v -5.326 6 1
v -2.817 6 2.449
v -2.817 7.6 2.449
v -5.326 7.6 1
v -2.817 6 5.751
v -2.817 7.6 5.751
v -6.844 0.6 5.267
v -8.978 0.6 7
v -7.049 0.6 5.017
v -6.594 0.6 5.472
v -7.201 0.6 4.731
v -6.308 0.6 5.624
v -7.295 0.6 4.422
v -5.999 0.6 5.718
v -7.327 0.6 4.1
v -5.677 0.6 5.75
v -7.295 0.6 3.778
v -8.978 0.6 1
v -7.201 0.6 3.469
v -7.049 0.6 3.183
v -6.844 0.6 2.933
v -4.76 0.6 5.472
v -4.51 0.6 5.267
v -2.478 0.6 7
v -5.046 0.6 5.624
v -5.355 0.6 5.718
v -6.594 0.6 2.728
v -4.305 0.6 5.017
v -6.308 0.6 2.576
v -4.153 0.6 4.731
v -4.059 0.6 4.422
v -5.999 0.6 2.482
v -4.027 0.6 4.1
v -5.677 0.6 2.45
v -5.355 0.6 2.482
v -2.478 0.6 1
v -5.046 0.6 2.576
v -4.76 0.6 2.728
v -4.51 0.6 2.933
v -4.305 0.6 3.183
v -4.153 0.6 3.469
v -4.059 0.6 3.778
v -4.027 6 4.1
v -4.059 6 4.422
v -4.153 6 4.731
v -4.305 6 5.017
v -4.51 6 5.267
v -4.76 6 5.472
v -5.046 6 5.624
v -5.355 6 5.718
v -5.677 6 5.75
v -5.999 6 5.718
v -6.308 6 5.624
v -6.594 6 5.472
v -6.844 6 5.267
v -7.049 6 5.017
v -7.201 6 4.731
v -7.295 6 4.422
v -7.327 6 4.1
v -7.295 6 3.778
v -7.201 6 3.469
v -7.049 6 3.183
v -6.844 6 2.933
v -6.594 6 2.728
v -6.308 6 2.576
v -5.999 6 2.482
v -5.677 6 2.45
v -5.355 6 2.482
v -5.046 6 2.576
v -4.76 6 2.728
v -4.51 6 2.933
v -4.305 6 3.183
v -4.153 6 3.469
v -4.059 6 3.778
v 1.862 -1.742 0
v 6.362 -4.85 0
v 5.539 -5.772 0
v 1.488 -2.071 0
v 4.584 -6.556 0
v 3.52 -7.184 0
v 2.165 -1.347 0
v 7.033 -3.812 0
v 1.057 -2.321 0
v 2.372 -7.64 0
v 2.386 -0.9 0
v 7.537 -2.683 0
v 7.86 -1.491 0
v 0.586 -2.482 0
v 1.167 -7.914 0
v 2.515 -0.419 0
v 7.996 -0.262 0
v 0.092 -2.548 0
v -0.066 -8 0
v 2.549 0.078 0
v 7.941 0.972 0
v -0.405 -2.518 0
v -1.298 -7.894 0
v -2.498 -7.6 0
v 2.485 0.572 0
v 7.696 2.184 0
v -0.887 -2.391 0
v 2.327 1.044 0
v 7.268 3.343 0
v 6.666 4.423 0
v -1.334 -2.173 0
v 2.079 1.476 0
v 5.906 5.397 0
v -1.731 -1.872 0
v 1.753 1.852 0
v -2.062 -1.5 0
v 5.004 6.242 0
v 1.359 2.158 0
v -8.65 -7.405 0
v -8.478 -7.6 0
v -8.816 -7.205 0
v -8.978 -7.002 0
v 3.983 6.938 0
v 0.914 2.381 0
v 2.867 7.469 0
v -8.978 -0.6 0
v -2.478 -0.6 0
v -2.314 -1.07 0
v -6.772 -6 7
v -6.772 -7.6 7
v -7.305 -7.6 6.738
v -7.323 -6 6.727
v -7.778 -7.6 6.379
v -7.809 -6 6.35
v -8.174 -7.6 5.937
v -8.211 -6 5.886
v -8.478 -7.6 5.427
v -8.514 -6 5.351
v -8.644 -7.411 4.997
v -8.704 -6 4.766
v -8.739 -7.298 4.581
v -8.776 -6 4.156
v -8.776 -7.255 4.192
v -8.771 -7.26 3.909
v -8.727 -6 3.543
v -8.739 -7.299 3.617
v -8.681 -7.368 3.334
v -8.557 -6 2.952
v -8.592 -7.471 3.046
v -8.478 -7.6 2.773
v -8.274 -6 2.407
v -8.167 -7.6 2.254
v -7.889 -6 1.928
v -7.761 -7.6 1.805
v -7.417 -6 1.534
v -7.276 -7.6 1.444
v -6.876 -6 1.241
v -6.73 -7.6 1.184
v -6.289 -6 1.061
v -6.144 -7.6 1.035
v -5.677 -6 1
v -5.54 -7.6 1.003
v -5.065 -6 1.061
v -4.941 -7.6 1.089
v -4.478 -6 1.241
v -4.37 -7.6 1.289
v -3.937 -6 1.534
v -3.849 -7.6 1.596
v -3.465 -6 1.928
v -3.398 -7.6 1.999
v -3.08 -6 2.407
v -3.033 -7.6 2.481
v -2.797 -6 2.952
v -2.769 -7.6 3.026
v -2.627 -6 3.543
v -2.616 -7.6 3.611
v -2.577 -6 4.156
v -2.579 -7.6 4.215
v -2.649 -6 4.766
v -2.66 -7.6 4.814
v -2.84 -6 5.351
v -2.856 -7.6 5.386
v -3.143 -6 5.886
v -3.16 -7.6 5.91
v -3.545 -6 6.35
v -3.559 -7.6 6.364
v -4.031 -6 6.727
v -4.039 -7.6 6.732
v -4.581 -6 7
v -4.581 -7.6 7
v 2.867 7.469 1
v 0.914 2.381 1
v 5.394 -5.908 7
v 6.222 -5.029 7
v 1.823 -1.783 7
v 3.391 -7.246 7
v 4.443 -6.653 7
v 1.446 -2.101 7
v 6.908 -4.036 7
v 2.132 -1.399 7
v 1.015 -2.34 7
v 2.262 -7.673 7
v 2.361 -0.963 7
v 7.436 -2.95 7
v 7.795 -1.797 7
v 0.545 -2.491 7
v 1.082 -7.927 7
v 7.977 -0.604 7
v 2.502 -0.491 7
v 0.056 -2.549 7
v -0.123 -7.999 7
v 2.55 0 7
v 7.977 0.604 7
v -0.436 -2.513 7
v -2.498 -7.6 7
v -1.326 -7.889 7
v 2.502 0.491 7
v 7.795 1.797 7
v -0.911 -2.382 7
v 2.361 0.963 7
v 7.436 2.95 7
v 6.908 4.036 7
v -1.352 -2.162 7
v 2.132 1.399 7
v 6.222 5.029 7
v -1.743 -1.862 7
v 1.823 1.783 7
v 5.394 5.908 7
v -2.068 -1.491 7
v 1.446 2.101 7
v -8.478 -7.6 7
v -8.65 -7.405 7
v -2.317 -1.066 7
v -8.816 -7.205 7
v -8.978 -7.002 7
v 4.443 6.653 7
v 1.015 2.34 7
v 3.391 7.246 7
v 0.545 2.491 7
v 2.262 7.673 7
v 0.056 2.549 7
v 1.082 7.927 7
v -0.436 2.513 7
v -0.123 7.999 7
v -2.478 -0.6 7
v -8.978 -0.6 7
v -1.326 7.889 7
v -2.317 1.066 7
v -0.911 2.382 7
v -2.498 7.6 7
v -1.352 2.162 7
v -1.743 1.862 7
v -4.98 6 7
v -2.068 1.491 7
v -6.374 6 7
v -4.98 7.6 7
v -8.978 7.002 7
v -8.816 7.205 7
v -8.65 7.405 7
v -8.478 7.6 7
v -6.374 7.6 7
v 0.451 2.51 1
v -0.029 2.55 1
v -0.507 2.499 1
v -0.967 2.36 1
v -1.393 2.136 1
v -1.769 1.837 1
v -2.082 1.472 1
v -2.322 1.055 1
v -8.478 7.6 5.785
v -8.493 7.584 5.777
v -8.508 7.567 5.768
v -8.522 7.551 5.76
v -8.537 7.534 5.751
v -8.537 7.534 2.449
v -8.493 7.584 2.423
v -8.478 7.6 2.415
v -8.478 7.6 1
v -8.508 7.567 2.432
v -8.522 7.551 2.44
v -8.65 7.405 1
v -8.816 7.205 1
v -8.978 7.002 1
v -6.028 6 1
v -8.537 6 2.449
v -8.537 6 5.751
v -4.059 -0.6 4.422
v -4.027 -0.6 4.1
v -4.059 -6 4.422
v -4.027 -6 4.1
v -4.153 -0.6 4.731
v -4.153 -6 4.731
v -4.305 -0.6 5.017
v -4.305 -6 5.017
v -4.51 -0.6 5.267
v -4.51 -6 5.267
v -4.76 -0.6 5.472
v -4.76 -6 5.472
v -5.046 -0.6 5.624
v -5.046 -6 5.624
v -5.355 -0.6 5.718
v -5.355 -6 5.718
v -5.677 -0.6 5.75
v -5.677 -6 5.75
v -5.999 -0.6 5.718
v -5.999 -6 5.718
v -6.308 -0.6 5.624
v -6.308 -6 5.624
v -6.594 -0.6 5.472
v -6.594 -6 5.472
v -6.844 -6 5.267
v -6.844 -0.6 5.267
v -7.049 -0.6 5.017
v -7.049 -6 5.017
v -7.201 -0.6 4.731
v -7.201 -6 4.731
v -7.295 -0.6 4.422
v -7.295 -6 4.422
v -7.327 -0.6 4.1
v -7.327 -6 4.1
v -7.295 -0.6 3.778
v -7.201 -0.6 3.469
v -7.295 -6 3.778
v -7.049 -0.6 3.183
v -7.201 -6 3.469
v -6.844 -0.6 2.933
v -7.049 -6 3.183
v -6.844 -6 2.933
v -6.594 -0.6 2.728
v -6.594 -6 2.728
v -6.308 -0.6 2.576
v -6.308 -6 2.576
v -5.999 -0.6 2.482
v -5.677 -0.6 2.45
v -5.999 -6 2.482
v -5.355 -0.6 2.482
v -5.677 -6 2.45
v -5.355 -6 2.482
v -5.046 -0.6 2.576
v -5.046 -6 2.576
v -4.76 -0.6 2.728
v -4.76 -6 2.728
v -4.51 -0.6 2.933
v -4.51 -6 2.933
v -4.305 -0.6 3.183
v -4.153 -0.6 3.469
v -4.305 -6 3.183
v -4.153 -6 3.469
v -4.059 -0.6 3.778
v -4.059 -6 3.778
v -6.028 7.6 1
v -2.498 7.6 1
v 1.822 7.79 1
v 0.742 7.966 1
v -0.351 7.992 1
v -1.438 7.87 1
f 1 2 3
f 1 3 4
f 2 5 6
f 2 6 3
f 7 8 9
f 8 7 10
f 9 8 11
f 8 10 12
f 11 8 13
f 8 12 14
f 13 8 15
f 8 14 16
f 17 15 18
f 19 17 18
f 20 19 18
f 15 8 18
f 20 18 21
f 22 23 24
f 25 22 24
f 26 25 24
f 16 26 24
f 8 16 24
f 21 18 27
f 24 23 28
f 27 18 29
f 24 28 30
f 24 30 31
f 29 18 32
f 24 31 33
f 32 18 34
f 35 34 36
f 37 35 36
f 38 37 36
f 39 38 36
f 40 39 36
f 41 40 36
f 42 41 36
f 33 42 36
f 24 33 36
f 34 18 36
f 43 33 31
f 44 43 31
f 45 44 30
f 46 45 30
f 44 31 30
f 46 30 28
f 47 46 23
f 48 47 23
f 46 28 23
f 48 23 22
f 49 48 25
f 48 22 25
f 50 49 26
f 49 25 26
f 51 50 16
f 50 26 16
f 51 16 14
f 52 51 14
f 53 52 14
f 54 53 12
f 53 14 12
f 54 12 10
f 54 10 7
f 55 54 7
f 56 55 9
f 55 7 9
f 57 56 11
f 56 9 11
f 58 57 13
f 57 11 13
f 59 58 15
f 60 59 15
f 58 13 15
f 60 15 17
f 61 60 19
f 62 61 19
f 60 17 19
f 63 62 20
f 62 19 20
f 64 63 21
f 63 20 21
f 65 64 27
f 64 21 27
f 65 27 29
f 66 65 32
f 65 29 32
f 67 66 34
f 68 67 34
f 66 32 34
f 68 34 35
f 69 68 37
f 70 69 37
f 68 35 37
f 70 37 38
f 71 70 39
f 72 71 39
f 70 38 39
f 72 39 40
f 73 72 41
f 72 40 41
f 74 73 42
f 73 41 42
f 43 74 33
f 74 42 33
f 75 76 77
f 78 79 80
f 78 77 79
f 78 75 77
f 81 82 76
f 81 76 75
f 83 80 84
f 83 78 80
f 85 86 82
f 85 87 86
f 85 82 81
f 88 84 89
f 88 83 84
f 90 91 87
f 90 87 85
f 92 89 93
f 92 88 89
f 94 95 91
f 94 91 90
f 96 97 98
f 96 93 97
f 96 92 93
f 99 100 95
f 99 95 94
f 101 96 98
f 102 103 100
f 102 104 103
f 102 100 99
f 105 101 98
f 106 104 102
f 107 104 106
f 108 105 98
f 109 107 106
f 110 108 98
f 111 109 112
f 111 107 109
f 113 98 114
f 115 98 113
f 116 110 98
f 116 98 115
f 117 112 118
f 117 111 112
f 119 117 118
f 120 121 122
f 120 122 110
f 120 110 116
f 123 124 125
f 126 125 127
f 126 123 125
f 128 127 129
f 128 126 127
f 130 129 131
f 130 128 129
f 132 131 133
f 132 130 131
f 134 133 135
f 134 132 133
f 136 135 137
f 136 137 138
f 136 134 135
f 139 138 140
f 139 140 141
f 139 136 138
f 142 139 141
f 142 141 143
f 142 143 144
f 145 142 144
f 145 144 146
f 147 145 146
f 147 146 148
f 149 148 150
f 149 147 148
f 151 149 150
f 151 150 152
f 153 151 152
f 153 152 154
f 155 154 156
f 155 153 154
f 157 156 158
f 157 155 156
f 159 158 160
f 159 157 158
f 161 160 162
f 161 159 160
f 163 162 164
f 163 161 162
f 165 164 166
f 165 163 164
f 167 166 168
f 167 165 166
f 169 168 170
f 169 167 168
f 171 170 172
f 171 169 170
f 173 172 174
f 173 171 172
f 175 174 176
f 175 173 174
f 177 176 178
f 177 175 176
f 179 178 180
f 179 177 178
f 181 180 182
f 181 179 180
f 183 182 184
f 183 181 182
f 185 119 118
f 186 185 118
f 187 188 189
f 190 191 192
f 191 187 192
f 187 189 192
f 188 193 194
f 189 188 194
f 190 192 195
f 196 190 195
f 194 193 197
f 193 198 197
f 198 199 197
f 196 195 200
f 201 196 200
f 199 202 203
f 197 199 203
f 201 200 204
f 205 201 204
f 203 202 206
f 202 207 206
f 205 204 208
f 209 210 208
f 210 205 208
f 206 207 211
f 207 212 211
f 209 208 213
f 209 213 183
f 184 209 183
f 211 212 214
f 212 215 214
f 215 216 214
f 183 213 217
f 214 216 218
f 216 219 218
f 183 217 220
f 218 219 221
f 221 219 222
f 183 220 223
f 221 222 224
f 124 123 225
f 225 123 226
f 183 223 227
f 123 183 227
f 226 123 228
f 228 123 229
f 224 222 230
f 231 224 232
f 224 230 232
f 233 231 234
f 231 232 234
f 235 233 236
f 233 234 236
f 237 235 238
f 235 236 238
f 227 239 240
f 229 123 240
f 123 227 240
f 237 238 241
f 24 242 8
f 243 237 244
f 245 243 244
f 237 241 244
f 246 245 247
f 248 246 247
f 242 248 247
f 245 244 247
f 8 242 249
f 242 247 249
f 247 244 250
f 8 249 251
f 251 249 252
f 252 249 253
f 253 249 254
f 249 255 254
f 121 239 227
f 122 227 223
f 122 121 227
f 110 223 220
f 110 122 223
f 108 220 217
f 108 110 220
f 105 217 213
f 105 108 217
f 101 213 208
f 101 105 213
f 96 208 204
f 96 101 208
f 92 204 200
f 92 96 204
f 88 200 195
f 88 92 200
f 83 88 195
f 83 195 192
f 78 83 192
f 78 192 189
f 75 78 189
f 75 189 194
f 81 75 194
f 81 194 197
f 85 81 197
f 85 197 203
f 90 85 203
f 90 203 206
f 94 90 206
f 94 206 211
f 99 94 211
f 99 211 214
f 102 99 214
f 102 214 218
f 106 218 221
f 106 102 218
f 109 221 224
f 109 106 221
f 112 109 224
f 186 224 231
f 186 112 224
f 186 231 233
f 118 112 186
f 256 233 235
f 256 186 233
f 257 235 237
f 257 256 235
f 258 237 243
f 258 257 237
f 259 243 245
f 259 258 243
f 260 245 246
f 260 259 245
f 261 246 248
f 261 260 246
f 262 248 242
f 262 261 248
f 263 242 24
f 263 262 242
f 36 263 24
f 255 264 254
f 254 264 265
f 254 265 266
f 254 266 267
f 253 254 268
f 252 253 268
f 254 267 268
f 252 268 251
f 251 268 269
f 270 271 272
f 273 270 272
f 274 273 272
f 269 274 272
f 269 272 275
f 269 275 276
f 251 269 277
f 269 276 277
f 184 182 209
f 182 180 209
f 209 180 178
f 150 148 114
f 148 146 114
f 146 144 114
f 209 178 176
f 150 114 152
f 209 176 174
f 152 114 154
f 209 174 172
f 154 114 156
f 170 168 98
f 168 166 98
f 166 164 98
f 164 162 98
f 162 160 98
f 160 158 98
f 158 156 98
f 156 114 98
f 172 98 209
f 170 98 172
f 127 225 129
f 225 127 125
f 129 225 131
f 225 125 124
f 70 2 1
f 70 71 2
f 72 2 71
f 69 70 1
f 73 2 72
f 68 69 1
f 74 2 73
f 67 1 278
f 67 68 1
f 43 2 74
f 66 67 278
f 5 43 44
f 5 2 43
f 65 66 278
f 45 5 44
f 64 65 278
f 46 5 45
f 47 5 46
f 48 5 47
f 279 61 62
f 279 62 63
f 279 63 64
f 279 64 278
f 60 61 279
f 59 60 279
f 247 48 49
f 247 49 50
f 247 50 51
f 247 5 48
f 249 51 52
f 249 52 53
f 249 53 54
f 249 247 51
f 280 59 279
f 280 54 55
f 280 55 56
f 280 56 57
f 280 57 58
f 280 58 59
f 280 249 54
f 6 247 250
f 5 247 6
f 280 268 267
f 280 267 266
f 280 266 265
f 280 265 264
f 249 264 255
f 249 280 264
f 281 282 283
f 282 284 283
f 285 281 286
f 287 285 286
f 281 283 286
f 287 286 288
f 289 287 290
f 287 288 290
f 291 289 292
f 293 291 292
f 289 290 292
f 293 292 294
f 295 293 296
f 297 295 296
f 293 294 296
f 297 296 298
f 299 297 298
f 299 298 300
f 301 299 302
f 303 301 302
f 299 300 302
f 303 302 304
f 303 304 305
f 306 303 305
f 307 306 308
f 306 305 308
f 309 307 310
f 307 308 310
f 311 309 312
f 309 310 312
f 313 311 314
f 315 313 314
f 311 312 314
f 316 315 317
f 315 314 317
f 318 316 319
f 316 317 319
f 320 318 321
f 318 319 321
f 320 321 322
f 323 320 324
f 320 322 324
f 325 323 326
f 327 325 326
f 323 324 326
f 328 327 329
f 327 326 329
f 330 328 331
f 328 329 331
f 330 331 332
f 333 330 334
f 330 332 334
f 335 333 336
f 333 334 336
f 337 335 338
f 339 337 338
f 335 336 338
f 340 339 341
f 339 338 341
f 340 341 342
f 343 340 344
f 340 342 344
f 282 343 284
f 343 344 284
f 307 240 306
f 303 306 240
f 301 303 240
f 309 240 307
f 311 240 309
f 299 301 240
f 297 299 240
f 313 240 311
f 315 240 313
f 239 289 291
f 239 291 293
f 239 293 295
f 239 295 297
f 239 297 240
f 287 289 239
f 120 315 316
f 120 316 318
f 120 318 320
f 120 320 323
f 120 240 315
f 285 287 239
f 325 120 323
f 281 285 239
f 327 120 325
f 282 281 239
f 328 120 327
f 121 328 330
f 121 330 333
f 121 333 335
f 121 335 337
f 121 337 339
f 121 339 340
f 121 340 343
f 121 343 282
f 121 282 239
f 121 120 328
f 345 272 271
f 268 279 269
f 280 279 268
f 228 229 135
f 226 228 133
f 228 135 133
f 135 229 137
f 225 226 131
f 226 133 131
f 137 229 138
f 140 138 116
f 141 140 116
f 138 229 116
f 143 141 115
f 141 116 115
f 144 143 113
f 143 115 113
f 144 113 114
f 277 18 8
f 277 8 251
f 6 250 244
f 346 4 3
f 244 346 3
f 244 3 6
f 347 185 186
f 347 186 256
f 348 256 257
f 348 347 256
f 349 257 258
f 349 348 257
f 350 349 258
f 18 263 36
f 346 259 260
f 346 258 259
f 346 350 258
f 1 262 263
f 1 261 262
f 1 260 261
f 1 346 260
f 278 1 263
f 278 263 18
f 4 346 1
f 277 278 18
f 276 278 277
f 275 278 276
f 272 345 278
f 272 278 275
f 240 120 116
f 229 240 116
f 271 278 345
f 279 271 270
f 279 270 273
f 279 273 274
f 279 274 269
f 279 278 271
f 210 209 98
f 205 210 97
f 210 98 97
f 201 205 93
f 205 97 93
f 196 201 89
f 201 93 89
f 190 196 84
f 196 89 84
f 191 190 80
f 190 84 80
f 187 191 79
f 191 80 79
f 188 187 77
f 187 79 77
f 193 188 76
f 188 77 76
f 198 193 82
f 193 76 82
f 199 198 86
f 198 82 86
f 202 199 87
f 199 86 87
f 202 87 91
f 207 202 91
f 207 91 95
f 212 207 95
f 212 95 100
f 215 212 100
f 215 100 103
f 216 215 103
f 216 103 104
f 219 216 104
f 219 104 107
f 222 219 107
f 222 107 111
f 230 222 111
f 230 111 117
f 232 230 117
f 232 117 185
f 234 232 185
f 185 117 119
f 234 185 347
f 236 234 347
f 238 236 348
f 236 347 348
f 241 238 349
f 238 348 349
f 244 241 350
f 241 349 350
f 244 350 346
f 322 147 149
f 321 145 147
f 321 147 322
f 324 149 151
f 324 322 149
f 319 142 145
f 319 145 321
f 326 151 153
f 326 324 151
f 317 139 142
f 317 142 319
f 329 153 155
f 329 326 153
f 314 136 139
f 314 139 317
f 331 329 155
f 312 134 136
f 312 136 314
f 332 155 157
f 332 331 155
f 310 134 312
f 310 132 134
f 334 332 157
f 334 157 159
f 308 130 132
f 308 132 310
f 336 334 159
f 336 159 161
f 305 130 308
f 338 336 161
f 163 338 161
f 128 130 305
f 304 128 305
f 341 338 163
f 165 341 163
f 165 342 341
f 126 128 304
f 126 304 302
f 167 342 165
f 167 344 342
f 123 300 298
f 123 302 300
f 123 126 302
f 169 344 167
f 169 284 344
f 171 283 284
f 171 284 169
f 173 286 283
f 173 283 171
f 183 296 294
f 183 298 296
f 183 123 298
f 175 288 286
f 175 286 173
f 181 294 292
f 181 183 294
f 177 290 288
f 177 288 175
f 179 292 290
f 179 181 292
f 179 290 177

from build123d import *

# Parameters (mm, degrees)
SKETCH002_AS_DRAWN_R                 = 1.65
EXTRUDE003_DEPTH                     = 6
EXTRUDE003_ONTO_SKETCH002_ROLL_ANGLE = 90
SKETCH003_R                          = 3.1
PAD_DEPTH                            = 5
PAD001_DEPTH                         = 5
EXTRUDE_DEPTH                        = 1
EXTRUDE002_DEPTH                     = 7


with BuildPart() as body:
    # Sketch002 as drawn → Extrude003 (new, symmetric)
    with BuildSketch(Plane.XY):
        with Locations((-5.676932, 4.1)):
            Circle(SKETCH002_AS_DRAWN_R)
    extrude(amount=EXTRUDE003_DEPTH, both=True)


with BuildPart() as body_1:
    # Extrude003 onto Sketch002 roll: moved
    add(body.part.rotate(Axis((0, 0, 0), (1, 0, 0)), EXTRUDE003_ONTO_SKETCH002_ROLL_ANGLE))


with BuildPart() as body_2:
    # Extrude003 onto Sketch002 placement: moved
    add(body_1.part)

    # Sketch003 (on Face3 of BaseFeature) → Pad (new body)
    with BuildSketch(Plane.XZ.offset(6)):
        with Locations((-5.676932, 4.1)):
            Circle(SKETCH003_R)
    extrude(amount=PAD_DEPTH)

    # Sketch004 (on Face1 of Pad) → Pad001 (join)
    with BuildSketch(Plane(origin=(0, 6, 0), x_dir=(-1, 0, 0), z_dir=(0, 1, 0))):
        Polygon((5.676932, 0.797556), (8.536932, 2.448778), (8.536932, 5.751222), (5.676932, 7.402444), (2.816932, 5.751222), (2.816932, 2.448778), align=None)
    extrude(amount=PAD001_DEPTH)


with BuildPart() as extrude001:
    # Sketch001 → Extrude (new body)
    with BuildSketch(Plane.XY):
        Polygon((0, 0), (-15, 0), (-15, 15.001059), (5.758367, 15.001059), align=None)
    extrude(amount=EXTRUDE_DEPTH)


with BuildPart() as cut001:
    # Sketch → Extrude002 (new body)
    with BuildSketch(Plane.XY):
        with BuildLine():
            ThreePointArc((-2.478407, -0.6), (2.55, 0), (-2.478407, 0.6))
            Line((-8.978407, 0.6), (-2.478407, 0.6))
            Line((-8.978407, 0.6), (-8.978407, 7.002256))
            ThreePointArc((-8.478407, 7.6), (-8.733522, 7.305407), (-8.978407, 7.002256))
            Line((-8.478407, 7.6), (-2.497999, 7.6))
            ThreePointArc((-2.497999, -7.6), (8, 0), (-2.497999, 7.6))
            Line((-8.478407, -7.6), (-2.497999, -7.6))
            ThreePointArc((-8.978407, -7.002256), (-8.733522, -7.305407), (-8.478407, -7.6))
            Line((-8.978407, -0.6), (-8.978407, -7.002256))
            Line((-8.978407, -0.6), (-2.478407, -0.6))
        make_face()
    extrude(amount=EXTRUDE002_DEPTH)

    # Cut: cut Extrude001
    add(extrude001.part, mode=Mode.SUBTRACT)

    # Cut001: cut Body
    add(body_2.part, mode=Mode.SUBTRACT)


solid = cut001.part
